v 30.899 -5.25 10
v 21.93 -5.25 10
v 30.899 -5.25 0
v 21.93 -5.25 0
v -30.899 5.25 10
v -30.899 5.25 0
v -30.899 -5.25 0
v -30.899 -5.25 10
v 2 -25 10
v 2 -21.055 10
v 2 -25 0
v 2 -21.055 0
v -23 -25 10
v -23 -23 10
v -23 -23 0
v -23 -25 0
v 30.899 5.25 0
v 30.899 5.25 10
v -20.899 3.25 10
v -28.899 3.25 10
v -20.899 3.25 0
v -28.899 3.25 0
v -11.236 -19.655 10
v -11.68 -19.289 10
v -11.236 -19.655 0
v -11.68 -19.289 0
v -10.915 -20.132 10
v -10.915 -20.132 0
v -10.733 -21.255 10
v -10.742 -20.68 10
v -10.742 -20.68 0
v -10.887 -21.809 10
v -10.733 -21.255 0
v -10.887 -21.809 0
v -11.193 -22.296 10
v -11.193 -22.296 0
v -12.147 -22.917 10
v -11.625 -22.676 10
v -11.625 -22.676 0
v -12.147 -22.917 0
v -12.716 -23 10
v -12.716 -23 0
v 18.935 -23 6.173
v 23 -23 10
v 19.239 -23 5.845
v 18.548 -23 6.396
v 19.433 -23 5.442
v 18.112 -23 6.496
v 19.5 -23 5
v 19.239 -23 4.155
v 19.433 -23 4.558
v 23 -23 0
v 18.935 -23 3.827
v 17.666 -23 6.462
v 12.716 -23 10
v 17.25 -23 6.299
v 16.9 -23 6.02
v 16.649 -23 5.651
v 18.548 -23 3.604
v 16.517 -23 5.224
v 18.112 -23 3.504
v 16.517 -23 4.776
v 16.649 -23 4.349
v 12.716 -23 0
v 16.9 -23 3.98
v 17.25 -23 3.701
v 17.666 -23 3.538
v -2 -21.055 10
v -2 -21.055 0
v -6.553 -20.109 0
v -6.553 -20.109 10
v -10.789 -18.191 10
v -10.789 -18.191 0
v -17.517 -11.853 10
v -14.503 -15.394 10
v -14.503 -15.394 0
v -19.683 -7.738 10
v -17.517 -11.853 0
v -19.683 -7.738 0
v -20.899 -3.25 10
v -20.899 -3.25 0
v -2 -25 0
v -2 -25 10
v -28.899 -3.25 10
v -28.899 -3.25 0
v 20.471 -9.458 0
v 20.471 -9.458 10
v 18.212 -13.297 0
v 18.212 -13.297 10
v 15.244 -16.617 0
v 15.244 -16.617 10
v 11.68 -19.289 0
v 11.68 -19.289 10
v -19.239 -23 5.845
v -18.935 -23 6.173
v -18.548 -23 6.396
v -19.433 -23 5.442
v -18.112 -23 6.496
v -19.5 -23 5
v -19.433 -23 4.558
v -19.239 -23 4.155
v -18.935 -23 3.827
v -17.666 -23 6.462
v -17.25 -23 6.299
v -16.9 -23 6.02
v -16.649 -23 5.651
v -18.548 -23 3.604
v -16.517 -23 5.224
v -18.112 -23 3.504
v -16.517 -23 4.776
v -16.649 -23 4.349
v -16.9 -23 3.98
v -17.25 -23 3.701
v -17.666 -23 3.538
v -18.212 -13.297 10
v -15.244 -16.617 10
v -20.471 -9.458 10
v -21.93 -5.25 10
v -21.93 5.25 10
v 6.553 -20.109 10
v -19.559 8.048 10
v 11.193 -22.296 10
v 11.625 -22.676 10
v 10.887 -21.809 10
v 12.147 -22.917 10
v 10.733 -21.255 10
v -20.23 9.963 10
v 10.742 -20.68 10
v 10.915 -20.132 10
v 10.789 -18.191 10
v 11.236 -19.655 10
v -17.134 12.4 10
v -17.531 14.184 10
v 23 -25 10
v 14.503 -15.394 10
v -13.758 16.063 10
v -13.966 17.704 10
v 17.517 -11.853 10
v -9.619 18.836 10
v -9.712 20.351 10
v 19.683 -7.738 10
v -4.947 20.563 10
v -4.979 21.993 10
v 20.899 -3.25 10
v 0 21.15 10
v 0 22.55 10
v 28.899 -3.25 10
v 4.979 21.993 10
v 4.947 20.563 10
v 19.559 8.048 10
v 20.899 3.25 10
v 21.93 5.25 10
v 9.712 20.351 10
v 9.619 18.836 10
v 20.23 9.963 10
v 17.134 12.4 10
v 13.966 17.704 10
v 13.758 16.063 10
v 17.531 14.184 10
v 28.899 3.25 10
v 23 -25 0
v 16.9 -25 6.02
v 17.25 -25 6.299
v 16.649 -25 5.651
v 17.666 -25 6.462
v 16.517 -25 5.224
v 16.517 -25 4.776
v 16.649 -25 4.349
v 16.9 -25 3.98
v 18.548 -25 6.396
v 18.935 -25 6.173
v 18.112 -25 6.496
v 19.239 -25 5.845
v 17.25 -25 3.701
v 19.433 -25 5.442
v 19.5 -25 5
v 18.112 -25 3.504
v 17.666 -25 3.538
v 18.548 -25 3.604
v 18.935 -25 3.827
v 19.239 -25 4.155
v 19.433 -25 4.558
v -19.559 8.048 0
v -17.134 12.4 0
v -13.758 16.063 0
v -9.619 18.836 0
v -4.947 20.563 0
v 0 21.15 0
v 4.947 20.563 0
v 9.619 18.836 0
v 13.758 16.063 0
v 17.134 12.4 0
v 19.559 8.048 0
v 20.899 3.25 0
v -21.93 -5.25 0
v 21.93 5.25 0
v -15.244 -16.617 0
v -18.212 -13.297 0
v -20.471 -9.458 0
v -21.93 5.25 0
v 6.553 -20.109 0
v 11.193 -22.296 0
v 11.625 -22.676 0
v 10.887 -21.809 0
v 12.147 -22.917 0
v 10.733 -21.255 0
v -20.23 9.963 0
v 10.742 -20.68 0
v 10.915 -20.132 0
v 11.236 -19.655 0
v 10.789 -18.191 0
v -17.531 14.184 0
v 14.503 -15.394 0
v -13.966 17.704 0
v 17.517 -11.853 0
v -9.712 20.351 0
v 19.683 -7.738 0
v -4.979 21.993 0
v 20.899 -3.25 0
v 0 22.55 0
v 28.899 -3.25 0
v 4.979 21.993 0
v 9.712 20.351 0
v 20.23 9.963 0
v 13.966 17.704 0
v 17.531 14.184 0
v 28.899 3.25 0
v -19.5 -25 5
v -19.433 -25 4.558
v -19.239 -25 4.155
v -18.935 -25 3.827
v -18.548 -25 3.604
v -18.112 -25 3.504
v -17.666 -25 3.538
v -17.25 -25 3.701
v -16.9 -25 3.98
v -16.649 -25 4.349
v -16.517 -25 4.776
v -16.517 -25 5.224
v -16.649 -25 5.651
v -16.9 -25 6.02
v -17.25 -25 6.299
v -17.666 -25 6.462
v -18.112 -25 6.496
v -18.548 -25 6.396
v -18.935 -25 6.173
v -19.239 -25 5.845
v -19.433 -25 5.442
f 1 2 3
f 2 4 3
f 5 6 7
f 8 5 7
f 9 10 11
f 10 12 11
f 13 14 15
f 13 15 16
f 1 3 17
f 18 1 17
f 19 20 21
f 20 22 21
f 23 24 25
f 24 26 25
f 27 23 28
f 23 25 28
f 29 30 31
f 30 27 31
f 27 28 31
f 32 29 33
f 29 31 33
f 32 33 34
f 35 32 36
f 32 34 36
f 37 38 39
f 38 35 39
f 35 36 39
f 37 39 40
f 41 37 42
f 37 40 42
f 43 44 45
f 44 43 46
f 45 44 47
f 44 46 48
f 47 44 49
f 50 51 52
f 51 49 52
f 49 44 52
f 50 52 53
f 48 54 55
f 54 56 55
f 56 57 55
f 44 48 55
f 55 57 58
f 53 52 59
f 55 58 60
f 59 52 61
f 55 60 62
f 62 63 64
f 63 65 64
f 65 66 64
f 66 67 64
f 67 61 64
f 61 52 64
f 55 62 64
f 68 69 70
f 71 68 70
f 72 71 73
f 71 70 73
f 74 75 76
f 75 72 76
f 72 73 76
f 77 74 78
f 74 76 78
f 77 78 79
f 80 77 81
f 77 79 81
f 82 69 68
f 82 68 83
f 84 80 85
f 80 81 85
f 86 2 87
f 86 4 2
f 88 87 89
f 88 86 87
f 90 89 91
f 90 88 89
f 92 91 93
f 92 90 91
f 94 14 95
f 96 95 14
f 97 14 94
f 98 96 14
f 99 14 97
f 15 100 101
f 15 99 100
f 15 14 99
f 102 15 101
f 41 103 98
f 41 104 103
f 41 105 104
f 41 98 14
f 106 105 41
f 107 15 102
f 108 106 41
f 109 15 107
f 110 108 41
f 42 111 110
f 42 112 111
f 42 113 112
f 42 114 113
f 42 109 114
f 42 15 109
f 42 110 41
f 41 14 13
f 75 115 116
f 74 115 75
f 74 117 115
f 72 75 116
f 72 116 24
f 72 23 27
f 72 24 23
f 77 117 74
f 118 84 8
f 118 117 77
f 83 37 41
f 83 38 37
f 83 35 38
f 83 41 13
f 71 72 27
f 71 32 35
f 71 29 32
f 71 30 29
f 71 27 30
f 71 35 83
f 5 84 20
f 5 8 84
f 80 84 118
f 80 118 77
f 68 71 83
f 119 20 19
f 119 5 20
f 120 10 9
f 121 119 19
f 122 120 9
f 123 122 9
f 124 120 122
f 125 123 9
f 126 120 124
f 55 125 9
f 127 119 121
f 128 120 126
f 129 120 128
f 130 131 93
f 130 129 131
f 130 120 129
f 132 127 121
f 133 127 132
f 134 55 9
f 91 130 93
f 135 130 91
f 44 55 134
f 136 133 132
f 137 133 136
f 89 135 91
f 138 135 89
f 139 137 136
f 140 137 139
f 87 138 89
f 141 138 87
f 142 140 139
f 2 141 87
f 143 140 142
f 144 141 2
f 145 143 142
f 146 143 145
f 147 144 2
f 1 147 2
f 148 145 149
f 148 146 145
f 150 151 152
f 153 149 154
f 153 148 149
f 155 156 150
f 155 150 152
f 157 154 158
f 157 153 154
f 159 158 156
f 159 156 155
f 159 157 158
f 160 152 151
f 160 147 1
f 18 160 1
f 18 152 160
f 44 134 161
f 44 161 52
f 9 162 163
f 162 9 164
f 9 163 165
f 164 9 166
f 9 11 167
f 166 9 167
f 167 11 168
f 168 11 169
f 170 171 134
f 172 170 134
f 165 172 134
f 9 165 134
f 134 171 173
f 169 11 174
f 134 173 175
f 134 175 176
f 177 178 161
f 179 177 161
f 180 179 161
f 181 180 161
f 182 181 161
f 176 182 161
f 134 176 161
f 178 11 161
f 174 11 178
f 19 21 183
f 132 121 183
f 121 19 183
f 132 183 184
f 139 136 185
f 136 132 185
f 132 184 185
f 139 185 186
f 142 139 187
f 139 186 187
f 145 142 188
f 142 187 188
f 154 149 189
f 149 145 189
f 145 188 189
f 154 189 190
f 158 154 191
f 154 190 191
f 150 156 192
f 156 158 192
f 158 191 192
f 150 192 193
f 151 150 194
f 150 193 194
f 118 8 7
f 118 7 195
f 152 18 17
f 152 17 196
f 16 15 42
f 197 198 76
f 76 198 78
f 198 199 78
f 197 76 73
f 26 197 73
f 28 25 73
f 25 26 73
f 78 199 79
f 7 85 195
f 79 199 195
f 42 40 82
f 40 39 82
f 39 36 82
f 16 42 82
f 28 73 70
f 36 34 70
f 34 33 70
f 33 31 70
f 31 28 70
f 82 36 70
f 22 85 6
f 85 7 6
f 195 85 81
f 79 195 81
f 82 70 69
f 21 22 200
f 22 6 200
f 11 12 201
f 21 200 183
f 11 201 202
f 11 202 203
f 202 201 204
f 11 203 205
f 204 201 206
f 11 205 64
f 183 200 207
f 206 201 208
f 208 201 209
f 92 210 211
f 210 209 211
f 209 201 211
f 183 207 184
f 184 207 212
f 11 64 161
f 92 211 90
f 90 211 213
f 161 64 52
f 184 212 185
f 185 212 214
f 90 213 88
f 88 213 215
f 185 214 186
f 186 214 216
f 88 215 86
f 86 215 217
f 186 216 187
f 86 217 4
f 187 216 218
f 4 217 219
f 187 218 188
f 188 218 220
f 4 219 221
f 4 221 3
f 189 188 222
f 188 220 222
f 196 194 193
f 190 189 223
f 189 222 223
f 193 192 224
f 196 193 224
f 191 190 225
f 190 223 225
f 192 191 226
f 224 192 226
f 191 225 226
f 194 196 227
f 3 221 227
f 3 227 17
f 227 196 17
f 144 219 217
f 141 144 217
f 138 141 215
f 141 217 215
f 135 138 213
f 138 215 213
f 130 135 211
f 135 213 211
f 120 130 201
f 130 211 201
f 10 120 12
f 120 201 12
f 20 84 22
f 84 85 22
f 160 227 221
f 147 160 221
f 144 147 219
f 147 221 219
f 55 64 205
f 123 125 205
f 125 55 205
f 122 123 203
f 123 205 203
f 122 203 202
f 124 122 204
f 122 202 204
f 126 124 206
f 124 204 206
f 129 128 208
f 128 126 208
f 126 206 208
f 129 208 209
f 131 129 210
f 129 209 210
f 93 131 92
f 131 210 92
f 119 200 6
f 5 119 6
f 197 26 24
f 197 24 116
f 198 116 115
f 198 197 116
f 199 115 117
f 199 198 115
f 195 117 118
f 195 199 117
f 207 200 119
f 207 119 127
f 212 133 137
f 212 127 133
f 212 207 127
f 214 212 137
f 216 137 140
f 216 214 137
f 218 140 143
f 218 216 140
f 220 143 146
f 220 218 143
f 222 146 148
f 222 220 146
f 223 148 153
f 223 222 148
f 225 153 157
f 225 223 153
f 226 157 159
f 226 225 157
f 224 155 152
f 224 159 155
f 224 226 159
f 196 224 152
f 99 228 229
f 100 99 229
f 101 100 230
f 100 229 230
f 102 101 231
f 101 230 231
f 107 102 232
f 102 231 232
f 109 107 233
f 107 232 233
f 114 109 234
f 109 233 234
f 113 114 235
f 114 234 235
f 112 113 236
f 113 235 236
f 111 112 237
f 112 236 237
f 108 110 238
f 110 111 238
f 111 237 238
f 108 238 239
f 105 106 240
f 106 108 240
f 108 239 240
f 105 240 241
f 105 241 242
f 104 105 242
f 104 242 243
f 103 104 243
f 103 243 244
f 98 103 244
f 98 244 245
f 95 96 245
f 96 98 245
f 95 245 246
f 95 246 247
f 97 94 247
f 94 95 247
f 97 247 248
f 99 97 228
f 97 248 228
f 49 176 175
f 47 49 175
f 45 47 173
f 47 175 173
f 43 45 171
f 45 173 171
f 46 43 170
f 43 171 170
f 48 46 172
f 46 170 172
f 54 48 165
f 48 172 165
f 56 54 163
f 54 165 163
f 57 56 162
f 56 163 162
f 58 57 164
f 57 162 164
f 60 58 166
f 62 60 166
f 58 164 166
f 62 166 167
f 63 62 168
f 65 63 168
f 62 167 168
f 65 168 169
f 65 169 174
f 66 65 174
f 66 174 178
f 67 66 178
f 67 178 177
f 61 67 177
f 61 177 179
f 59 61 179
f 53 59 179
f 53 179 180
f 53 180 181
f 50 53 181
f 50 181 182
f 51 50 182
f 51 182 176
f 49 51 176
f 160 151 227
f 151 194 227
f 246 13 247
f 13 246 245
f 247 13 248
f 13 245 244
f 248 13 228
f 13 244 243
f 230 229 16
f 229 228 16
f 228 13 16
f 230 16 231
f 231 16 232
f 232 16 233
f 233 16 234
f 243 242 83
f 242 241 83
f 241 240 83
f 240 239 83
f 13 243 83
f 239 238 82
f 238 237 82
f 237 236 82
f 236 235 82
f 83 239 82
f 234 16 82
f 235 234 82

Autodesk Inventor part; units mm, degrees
ref_plane "YZ Plane" through (0, 0, 0) normal (1, 0, 0) x (0, 1, 0)
ref_plane "XZ Plane" through (0, 0, 0) normal (0, 1, 0) x (-1, 0, 0)
ref_plane "XY Plane" through (0, 0, 0) normal (0, 0, 1) x (1, 0, 0)
sketch "Sketch1" plane through (0, 0, 0) normal (0, 0, 1) x (1, 0, 0)
  circle A0 centre (0, 0) radius 21.15 construction
  line L0 (-18, -25) -> (18, -25) construction
  line L1 (-18, -25) -> (-18, -38.1522) construction
  line L2 (18, -25) -> (18, -38.1522) construction
  line L3 (-23, -23) -> (-23, -25)
  line L4 (-23, -25) -> (-2, -25)
  line L5 (-2, -21.0552) -> (-2, -25)
  line L6 (2, -21.0552) -> (2, -25)
  line L7 (2, -25) -> (23, -25)
  line L8 (23, -25) -> (23, -23)
  line L9 (23, -23) -> (12.7162, -23)
  line L10 (-23, -23) -> (-12.7162, -23)
  arc A1 (2, -21.0552) -> (-2, -21.0552) centre (0, 0) ccw
  arc A2 (11.6803, -19.2892) -> (12.7162, -23) centre (12.7162, -21) ccw
  arc A3 (-12.7162, -23) -> (-11.6803, -19.2892) centre (-12.7162, -21) ccw
  arc A4 (-21.9303, -5.25) -> (-11.6803, -19.2892) centre (0, 0) ccw
  arc A5 (11.6803, -19.2892) -> (21.9303, -5.25) centre (0, 0) ccw
  arc A6 (21.9303, 5.25) -> (-21.9303, 5.25) centre (0, 0) ccw
  line L11 (20.8988, 3.25) -> (28.8988, 3.25)
  line L12 (28.8988, 3.25) -> (28.8988, -3.25)
  line L13 (28.8988, -3.25) -> (20.8988, -3.25)
  line L14 (20.8988, -5.25) -> (30.8988, -5.25)
  line L15 (30.8988, -5.25) -> (30.8988, 5.25)
  line L16 (30.8988, 5.25) -> (20.8988, 5.25)
  line L17 (-21.9303, 5.25) -> (-30.8988, 5.25)
  line L18 (-30.8988, 5.25) -> (-30.8988, -5.25)
  line L19 (-30.8988, -5.25) -> (-21.9303, -5.25)
  line L20 (-20.8988, -3.25) -> (-28.8988, -3.25)
  line L21 (-28.8988, -3.25) -> (-28.8988, 3.25)
  line L22 (-28.8988, 3.25) -> (-20.8988, 3.25)
  point P0 (0, -25)
  point P1 (28.8988, 0)
  point P2 (-28.8988, 0)
  dimension "d13" = 42.3
  dimension "d1" = 25
  dimension "d2" = 36
  dimension "d3" = 2
  dimension "d5" = 5
  dimension "d6" = 2
  dimension "d7" = 4
  dimension "d19" = 22.55
  dimension "d20" = 8
  dimension "d21" = 6.5
  dimension "d22" = 2
  dimension "d23" = 6.5
  dimension "d24" = 8
  dimension "d25" = 2
  dimension "d26" = 2
  dimension "d27" = 2
extrude "Extrusion1" add sketch "Sketch1" along normal blind 10 contours L10 A3 A4 L19 L18 L17 A6 L16 L15 L14 A5 A2 L9 L8 L7 L6 A1 L13 L12 L11 L22 L21 L20 L5 L4 L3
sketch "Sketch2" plane through (2, -25, 0) normal (0, -1, 0) x (1, 0, 0)
  circle A0 centre (16, 5) radius 1.5
  line L0 (21, 0) -> (21, 10) projected
  point P0 (-2, 0)
  point P1 (16, 0)
  point P2 (16, 0)
  point P3 (16, 0)
  point P4 (21, 5)
  dimension "d10" = 3
extrude "Extrusion2" cut sketch "Sketch2" against normal up to surface (2 mm away)
mirror "Mirror1" about plane through (0, 0, 0) normal (1, 0, 0) of "Extrusion2"
properties part number "OmegaRing" material "ABS Plastic"
